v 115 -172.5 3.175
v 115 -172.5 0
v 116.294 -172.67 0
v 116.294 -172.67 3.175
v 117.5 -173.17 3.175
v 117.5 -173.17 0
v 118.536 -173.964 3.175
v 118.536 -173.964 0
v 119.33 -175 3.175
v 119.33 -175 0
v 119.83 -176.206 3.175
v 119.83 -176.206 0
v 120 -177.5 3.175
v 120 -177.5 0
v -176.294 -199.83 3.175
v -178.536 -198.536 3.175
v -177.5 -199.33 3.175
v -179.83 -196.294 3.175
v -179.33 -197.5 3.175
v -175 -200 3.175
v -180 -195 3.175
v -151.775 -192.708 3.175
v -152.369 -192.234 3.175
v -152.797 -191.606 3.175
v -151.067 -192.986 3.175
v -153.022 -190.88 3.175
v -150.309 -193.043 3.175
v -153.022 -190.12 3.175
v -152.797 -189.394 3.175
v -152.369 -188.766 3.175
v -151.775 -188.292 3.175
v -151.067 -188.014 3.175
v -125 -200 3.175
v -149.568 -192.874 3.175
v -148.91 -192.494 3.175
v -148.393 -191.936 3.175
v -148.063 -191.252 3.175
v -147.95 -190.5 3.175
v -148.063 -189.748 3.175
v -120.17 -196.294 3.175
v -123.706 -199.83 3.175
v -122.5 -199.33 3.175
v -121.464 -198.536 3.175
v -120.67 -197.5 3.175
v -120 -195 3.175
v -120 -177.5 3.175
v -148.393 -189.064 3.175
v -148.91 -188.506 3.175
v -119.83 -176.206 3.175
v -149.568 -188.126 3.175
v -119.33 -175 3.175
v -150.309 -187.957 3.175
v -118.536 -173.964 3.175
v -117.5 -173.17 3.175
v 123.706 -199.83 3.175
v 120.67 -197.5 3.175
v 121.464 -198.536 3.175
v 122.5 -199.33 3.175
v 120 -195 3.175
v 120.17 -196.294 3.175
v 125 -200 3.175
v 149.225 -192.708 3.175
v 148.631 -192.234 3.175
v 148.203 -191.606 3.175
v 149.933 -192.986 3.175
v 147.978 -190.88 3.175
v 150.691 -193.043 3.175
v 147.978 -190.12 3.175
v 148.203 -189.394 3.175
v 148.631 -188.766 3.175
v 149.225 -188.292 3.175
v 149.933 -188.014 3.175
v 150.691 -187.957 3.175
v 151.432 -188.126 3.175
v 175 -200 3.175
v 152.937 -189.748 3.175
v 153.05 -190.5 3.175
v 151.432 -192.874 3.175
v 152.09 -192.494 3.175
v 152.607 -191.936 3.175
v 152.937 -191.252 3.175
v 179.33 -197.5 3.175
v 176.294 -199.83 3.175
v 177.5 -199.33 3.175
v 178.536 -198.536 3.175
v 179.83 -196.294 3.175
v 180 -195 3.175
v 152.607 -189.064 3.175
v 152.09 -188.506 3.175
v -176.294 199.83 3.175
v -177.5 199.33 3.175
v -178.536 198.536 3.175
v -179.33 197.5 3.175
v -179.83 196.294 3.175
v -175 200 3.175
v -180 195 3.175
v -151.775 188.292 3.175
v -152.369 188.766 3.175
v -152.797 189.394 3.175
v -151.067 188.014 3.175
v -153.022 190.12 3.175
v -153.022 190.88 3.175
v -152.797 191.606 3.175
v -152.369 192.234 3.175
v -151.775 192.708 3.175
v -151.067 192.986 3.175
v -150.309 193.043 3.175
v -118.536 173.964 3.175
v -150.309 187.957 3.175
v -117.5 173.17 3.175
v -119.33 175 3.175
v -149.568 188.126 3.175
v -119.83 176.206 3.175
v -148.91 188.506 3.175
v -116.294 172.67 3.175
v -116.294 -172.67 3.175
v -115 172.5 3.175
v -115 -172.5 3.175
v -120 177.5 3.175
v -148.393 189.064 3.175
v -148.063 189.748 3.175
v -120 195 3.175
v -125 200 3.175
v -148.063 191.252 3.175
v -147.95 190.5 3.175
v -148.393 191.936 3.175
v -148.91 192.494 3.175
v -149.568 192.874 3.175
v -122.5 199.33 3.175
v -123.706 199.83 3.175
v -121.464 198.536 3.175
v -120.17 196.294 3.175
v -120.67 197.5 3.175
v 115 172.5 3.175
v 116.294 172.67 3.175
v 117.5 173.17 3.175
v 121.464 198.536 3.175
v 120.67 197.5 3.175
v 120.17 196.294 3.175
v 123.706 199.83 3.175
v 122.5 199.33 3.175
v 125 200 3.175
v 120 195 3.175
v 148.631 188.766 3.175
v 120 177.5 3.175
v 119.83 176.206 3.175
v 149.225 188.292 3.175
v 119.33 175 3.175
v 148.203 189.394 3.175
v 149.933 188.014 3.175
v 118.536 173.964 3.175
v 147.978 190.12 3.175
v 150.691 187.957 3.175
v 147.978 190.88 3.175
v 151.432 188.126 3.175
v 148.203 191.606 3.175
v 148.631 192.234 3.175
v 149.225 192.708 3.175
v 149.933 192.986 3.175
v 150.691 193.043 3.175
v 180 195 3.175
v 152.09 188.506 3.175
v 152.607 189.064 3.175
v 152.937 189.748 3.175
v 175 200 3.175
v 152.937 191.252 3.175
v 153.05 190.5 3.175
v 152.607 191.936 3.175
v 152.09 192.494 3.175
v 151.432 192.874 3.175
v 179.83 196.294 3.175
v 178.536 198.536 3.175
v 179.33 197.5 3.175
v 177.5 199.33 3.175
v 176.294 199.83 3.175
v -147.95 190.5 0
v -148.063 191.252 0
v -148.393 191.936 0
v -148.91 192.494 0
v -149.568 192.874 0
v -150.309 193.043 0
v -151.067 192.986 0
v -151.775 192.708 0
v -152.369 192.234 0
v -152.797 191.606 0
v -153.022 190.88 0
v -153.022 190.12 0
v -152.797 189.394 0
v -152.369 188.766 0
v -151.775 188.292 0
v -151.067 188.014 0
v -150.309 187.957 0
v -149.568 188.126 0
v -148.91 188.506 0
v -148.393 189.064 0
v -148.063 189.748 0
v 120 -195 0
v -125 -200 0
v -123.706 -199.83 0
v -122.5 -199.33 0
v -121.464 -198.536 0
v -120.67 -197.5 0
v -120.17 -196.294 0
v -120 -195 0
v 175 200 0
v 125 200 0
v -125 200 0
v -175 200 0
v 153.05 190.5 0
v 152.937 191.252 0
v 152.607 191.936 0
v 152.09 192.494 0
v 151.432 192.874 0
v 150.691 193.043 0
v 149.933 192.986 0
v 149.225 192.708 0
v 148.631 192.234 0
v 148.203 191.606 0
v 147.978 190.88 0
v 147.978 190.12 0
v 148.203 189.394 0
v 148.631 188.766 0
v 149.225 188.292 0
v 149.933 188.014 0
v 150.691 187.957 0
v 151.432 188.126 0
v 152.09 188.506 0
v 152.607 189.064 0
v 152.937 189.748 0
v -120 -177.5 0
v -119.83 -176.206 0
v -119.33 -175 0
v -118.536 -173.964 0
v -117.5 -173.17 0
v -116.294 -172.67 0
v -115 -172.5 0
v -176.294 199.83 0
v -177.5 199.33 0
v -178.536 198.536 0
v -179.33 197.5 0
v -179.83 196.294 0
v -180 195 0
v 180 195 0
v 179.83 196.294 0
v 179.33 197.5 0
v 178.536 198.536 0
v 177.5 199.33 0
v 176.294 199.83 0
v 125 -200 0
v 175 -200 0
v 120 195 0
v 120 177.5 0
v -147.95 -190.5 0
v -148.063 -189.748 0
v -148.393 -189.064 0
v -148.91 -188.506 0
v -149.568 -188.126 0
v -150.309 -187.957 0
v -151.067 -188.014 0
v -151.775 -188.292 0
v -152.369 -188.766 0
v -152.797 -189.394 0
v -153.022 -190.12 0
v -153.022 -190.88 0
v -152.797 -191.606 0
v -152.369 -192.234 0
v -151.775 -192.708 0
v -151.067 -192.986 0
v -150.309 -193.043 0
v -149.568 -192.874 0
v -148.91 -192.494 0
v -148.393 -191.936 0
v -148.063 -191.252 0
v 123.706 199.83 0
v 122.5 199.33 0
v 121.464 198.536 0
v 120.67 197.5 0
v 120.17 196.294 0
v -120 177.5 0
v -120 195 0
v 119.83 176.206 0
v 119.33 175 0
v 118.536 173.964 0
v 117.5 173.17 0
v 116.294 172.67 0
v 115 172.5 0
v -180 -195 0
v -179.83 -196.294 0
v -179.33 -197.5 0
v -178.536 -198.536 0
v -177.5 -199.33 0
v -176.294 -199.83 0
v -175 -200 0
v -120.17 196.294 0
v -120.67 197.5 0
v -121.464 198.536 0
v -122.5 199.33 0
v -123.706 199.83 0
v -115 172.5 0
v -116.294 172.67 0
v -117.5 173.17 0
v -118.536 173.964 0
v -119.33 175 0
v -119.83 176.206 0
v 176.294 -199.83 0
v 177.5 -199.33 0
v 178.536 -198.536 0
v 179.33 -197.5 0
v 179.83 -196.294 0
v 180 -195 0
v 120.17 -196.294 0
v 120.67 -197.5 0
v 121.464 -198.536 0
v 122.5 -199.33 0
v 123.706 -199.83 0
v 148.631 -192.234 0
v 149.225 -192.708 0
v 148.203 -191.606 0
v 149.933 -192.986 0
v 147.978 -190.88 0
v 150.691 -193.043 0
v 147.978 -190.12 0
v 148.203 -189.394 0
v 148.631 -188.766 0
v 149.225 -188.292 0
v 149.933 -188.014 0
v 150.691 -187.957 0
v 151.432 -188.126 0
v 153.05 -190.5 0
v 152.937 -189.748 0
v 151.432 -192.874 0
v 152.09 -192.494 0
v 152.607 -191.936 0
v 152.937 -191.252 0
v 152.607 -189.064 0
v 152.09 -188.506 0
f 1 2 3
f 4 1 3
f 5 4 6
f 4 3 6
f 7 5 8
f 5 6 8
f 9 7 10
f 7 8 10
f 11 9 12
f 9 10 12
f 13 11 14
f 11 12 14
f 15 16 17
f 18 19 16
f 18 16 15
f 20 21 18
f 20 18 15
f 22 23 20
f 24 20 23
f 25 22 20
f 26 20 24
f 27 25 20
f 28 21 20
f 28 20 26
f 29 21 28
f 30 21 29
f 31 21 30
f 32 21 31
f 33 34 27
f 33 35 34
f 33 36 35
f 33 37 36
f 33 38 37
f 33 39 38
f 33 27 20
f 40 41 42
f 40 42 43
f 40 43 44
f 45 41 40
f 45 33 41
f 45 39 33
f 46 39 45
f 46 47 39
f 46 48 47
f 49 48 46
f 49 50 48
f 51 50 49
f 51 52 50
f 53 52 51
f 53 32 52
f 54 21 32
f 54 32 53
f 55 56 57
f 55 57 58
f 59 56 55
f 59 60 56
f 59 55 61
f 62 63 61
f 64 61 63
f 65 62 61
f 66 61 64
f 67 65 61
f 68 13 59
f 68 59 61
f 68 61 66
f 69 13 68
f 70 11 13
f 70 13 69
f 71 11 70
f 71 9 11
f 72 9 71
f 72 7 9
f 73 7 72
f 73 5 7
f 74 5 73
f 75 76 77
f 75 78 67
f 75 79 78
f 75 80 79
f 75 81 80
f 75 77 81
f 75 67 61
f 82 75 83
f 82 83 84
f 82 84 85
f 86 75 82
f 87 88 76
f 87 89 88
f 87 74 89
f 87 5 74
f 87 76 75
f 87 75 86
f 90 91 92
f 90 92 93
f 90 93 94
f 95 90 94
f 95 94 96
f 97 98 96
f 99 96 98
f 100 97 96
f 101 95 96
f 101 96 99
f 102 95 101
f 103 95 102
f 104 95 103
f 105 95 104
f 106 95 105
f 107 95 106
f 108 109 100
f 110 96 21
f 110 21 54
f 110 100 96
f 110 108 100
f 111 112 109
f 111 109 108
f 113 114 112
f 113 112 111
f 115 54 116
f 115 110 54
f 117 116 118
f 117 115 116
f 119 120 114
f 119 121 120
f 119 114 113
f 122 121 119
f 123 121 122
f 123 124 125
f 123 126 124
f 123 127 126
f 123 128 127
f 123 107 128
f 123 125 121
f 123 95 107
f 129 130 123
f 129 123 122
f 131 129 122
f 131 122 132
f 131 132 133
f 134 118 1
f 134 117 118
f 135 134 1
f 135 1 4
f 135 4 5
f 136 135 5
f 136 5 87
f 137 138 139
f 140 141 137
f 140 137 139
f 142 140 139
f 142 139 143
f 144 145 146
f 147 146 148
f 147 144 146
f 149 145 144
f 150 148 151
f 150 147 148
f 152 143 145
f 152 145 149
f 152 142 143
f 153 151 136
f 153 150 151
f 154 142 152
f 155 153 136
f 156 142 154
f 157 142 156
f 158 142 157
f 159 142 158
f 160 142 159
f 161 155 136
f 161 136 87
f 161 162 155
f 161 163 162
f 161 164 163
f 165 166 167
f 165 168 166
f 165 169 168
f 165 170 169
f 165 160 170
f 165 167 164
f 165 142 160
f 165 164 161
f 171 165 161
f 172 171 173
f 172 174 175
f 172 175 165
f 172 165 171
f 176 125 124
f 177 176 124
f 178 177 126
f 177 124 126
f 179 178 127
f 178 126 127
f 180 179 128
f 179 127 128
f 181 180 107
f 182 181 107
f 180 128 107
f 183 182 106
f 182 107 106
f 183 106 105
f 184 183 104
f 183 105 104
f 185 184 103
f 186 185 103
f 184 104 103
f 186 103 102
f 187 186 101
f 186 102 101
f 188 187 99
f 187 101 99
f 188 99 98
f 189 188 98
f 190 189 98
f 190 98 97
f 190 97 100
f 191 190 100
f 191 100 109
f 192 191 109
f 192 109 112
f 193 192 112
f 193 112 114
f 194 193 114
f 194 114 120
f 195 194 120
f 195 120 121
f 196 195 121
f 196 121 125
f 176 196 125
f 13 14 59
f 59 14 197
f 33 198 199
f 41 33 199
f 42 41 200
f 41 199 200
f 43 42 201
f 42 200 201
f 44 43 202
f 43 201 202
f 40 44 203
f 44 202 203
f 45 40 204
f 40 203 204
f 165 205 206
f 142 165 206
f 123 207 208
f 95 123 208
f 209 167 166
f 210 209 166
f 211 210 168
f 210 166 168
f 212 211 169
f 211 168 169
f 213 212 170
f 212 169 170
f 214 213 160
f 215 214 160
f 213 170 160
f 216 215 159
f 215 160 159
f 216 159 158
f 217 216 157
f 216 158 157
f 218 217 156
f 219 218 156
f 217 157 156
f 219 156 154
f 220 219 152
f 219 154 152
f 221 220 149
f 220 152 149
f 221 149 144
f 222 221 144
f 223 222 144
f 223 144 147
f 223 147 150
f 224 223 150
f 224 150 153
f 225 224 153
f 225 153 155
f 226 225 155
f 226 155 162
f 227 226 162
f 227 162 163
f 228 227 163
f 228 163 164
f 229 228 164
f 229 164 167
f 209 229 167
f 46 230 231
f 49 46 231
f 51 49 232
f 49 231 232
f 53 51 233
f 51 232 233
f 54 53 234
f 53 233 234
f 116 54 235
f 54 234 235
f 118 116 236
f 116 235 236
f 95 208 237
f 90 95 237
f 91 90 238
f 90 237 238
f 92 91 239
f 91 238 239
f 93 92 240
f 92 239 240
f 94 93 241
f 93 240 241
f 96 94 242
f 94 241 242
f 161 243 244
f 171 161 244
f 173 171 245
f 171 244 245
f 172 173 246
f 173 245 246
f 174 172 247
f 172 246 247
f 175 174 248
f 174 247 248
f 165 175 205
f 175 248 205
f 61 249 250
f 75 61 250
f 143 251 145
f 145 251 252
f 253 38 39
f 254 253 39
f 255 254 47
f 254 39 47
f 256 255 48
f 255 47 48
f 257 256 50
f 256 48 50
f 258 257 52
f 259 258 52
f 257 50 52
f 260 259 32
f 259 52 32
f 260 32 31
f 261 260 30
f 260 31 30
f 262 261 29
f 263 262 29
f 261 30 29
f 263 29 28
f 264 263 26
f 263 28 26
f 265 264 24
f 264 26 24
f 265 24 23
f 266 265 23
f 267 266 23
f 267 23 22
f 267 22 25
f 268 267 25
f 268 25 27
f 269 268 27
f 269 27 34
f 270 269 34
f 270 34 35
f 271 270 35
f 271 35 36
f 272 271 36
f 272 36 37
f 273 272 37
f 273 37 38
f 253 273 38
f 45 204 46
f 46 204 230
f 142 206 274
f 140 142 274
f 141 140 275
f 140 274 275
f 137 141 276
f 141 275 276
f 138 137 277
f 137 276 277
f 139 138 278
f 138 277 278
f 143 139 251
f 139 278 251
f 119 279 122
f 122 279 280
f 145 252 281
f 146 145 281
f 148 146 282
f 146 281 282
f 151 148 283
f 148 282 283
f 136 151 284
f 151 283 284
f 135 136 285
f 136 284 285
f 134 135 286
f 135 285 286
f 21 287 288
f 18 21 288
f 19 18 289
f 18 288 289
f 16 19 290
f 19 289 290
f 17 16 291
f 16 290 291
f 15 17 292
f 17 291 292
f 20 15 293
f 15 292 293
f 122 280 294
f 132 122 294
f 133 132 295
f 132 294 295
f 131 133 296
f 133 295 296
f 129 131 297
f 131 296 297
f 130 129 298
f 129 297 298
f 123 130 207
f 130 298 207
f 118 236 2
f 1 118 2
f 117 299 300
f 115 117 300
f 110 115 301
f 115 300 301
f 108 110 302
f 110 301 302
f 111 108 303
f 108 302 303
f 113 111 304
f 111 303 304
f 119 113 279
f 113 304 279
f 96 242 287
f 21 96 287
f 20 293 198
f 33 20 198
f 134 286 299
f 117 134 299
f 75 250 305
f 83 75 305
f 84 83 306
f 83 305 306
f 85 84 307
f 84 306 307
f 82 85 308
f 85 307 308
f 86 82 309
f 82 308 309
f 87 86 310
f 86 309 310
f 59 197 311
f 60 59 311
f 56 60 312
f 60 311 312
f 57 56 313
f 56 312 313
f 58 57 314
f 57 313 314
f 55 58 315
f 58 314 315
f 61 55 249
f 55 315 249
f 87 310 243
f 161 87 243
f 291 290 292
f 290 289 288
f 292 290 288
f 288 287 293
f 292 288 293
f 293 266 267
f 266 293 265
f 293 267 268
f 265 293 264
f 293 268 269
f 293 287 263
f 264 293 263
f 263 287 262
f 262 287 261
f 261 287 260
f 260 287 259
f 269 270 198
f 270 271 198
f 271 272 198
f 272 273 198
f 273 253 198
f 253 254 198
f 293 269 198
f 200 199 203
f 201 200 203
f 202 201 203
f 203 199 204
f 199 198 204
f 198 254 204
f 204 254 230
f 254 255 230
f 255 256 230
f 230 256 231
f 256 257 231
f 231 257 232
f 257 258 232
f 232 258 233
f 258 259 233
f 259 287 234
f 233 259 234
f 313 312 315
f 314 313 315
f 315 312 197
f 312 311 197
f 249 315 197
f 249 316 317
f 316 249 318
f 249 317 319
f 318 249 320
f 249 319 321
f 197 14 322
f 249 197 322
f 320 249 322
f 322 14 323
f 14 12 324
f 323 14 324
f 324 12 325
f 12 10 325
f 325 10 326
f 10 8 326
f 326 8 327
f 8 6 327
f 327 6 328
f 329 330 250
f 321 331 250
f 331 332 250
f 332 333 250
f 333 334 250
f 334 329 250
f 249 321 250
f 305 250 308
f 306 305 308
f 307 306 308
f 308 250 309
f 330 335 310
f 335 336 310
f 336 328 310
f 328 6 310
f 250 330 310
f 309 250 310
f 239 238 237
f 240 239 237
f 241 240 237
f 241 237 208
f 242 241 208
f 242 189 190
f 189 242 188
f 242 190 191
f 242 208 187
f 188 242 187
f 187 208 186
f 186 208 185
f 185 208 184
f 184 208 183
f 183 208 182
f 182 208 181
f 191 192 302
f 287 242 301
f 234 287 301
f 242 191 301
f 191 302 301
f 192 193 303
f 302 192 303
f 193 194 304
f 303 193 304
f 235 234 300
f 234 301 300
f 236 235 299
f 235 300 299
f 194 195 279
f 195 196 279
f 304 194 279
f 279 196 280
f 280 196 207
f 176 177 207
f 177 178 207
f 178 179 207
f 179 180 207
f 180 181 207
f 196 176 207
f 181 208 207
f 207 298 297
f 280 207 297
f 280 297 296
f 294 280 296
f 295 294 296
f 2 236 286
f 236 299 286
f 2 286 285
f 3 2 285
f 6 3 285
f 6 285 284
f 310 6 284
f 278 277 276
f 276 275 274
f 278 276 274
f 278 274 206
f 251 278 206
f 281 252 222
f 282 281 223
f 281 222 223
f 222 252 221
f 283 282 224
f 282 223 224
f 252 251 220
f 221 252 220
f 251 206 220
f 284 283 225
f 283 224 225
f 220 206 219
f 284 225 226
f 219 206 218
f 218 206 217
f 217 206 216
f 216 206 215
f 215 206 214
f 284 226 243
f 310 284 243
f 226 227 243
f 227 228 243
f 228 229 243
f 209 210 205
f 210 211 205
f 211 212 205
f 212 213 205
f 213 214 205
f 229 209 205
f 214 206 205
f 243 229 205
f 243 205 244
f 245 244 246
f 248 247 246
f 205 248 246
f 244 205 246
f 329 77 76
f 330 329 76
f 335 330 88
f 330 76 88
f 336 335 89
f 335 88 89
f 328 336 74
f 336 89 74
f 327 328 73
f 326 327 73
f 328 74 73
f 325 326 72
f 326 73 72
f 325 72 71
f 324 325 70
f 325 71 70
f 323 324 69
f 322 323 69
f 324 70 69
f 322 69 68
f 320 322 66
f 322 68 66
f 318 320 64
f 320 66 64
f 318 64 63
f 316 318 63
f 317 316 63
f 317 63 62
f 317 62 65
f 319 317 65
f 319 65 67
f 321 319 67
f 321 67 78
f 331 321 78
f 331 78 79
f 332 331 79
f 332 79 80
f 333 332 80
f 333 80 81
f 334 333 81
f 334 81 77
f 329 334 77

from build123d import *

# Parameters (mm, degrees)
BOSS_EXTRUDE1_DEPTH = 3.175
CUT_EXTRUDE1_REACH  = 5.175
SKETCH2_R           = 2.55


with BuildPart() as part:
    # Model → Boss-Extrude1 (new body)
    with BuildSketch(Plane.XY):
        with BuildLine():
            Line((175, 200), (125, 200))
            ThreePointArc((125, 200), (121.464466094, 198.535533906), (120, 195))
            Line((120, 195), (120, 177.5))
            ThreePointArc((120, 177.5), (118.535533906, 173.964466094), (115, 172.5))
            Line((115, 172.5), (-115, 172.5))
            ThreePointArc((-115, 172.5), (-118.535533906, 173.964466094), (-120, 177.5))
            Line((-120, 177.5), (-120, 195))
            ThreePointArc((-120, 195), (-121.464466094, 198.535533906), (-125, 200))
            Line((-125, 200), (-175, 200))
            ThreePointArc((-175, 200), (-178.535533906, 198.535533906), (-180, 195))
            Line((-180, 195), (-180, -195))
            ThreePointArc((-180, -195), (-178.535533906, -198.535533906), (-175, -200))
            Line((-175, -200), (-125, -200))
            ThreePointArc((-125, -200), (-121.464466094, -198.535533906), (-120, -195))
            Line((-120, -195), (-120, -177.5))
            ThreePointArc((-120, -177.5), (-118.535533906, -173.964466094), (-115, -172.5))
            Line((-115, -172.5), (115, -172.5))
            ThreePointArc((115, -172.5), (118.535533906, -173.964466094), (120, -177.5))
            Line((120, -177.5), (120, -195))
            ThreePointArc((120, -195), (121.464466094, -198.535533906), (125, -200))
            Line((125, -200), (175, -200))
            ThreePointArc((175, -200), (178.535533906, -198.535533906), (180, -195))
            Line((180, -195), (180, 195))
            ThreePointArc((180, 195), (178.535533906, 198.535533906), (175, 200))
        make_face()
    extrude(amount=BOSS_EXTRUDE1_DEPTH)

    # Sketch2 → Cut-Extrude1 (cut, up to next)
    with BuildSketch(Plane.XY.offset(3.175), mode=Mode.PRIVATE) as cut_extrude1_sk1:
        with Locations((-150.5, 190.5)):
            Circle(SKETCH2_R)
    cut_extrude1_tool1 = extrude(cut_extrude1_sk1.sketch, amount=-CUT_EXTRUDE1_REACH, mode=Mode.PRIVATE) & part.part
    add(cut_extrude1_tool1.solids().sort_by_distance((-150.5, 190.5, 3.175))[0], mode=Mode.SUBTRACT)
    # Sketch2 → Cut-Extrude1 (cut, up to next)
    with BuildSketch(Plane.XY.offset(3.175), mode=Mode.PRIVATE) as cut_extrude1_sk2:
        with Locations((-150.5, -190.5)):
            Circle(SKETCH2_R)
    cut_extrude1_tool2 = extrude(cut_extrude1_sk2.sketch, amount=-CUT_EXTRUDE1_REACH, mode=Mode.PRIVATE) & part.part
    add(cut_extrude1_tool2.solids().sort_by_distance((-150.5, -190.5, 3.175))[0], mode=Mode.SUBTRACT)
    # Sketch2 → Cut-Extrude1 (cut, up to next)
    with BuildSketch(Plane.XY.offset(3.175), mode=Mode.PRIVATE) as cut_extrude1_sk3:
        with Locations((150.5, -190.5)):
            Circle(SKETCH2_R)
    cut_extrude1_tool3 = extrude(cut_extrude1_sk3.sketch, amount=-CUT_EXTRUDE1_REACH, mode=Mode.PRIVATE) & part.part
    add(cut_extrude1_tool3.solids().sort_by_distance((150.5, -190.5, 3.175))[0], mode=Mode.SUBTRACT)
    # Sketch2 → Cut-Extrude1 (cut, up to next)
    with BuildSketch(Plane.XY.offset(3.175), mode=Mode.PRIVATE) as cut_extrude1_sk4:
        with Locations((150.5, 190.5)):
            Circle(SKETCH2_R)
    cut_extrude1_tool4 = extrude(cut_extrude1_sk4.sketch, amount=-CUT_EXTRUDE1_REACH, mode=Mode.PRIVATE) & part.part
    add(cut_extrude1_tool4.solids().sort_by_distance((150.5, 190.5, 3.175))[0], mode=Mode.SUBTRACT)


solid = part.part
